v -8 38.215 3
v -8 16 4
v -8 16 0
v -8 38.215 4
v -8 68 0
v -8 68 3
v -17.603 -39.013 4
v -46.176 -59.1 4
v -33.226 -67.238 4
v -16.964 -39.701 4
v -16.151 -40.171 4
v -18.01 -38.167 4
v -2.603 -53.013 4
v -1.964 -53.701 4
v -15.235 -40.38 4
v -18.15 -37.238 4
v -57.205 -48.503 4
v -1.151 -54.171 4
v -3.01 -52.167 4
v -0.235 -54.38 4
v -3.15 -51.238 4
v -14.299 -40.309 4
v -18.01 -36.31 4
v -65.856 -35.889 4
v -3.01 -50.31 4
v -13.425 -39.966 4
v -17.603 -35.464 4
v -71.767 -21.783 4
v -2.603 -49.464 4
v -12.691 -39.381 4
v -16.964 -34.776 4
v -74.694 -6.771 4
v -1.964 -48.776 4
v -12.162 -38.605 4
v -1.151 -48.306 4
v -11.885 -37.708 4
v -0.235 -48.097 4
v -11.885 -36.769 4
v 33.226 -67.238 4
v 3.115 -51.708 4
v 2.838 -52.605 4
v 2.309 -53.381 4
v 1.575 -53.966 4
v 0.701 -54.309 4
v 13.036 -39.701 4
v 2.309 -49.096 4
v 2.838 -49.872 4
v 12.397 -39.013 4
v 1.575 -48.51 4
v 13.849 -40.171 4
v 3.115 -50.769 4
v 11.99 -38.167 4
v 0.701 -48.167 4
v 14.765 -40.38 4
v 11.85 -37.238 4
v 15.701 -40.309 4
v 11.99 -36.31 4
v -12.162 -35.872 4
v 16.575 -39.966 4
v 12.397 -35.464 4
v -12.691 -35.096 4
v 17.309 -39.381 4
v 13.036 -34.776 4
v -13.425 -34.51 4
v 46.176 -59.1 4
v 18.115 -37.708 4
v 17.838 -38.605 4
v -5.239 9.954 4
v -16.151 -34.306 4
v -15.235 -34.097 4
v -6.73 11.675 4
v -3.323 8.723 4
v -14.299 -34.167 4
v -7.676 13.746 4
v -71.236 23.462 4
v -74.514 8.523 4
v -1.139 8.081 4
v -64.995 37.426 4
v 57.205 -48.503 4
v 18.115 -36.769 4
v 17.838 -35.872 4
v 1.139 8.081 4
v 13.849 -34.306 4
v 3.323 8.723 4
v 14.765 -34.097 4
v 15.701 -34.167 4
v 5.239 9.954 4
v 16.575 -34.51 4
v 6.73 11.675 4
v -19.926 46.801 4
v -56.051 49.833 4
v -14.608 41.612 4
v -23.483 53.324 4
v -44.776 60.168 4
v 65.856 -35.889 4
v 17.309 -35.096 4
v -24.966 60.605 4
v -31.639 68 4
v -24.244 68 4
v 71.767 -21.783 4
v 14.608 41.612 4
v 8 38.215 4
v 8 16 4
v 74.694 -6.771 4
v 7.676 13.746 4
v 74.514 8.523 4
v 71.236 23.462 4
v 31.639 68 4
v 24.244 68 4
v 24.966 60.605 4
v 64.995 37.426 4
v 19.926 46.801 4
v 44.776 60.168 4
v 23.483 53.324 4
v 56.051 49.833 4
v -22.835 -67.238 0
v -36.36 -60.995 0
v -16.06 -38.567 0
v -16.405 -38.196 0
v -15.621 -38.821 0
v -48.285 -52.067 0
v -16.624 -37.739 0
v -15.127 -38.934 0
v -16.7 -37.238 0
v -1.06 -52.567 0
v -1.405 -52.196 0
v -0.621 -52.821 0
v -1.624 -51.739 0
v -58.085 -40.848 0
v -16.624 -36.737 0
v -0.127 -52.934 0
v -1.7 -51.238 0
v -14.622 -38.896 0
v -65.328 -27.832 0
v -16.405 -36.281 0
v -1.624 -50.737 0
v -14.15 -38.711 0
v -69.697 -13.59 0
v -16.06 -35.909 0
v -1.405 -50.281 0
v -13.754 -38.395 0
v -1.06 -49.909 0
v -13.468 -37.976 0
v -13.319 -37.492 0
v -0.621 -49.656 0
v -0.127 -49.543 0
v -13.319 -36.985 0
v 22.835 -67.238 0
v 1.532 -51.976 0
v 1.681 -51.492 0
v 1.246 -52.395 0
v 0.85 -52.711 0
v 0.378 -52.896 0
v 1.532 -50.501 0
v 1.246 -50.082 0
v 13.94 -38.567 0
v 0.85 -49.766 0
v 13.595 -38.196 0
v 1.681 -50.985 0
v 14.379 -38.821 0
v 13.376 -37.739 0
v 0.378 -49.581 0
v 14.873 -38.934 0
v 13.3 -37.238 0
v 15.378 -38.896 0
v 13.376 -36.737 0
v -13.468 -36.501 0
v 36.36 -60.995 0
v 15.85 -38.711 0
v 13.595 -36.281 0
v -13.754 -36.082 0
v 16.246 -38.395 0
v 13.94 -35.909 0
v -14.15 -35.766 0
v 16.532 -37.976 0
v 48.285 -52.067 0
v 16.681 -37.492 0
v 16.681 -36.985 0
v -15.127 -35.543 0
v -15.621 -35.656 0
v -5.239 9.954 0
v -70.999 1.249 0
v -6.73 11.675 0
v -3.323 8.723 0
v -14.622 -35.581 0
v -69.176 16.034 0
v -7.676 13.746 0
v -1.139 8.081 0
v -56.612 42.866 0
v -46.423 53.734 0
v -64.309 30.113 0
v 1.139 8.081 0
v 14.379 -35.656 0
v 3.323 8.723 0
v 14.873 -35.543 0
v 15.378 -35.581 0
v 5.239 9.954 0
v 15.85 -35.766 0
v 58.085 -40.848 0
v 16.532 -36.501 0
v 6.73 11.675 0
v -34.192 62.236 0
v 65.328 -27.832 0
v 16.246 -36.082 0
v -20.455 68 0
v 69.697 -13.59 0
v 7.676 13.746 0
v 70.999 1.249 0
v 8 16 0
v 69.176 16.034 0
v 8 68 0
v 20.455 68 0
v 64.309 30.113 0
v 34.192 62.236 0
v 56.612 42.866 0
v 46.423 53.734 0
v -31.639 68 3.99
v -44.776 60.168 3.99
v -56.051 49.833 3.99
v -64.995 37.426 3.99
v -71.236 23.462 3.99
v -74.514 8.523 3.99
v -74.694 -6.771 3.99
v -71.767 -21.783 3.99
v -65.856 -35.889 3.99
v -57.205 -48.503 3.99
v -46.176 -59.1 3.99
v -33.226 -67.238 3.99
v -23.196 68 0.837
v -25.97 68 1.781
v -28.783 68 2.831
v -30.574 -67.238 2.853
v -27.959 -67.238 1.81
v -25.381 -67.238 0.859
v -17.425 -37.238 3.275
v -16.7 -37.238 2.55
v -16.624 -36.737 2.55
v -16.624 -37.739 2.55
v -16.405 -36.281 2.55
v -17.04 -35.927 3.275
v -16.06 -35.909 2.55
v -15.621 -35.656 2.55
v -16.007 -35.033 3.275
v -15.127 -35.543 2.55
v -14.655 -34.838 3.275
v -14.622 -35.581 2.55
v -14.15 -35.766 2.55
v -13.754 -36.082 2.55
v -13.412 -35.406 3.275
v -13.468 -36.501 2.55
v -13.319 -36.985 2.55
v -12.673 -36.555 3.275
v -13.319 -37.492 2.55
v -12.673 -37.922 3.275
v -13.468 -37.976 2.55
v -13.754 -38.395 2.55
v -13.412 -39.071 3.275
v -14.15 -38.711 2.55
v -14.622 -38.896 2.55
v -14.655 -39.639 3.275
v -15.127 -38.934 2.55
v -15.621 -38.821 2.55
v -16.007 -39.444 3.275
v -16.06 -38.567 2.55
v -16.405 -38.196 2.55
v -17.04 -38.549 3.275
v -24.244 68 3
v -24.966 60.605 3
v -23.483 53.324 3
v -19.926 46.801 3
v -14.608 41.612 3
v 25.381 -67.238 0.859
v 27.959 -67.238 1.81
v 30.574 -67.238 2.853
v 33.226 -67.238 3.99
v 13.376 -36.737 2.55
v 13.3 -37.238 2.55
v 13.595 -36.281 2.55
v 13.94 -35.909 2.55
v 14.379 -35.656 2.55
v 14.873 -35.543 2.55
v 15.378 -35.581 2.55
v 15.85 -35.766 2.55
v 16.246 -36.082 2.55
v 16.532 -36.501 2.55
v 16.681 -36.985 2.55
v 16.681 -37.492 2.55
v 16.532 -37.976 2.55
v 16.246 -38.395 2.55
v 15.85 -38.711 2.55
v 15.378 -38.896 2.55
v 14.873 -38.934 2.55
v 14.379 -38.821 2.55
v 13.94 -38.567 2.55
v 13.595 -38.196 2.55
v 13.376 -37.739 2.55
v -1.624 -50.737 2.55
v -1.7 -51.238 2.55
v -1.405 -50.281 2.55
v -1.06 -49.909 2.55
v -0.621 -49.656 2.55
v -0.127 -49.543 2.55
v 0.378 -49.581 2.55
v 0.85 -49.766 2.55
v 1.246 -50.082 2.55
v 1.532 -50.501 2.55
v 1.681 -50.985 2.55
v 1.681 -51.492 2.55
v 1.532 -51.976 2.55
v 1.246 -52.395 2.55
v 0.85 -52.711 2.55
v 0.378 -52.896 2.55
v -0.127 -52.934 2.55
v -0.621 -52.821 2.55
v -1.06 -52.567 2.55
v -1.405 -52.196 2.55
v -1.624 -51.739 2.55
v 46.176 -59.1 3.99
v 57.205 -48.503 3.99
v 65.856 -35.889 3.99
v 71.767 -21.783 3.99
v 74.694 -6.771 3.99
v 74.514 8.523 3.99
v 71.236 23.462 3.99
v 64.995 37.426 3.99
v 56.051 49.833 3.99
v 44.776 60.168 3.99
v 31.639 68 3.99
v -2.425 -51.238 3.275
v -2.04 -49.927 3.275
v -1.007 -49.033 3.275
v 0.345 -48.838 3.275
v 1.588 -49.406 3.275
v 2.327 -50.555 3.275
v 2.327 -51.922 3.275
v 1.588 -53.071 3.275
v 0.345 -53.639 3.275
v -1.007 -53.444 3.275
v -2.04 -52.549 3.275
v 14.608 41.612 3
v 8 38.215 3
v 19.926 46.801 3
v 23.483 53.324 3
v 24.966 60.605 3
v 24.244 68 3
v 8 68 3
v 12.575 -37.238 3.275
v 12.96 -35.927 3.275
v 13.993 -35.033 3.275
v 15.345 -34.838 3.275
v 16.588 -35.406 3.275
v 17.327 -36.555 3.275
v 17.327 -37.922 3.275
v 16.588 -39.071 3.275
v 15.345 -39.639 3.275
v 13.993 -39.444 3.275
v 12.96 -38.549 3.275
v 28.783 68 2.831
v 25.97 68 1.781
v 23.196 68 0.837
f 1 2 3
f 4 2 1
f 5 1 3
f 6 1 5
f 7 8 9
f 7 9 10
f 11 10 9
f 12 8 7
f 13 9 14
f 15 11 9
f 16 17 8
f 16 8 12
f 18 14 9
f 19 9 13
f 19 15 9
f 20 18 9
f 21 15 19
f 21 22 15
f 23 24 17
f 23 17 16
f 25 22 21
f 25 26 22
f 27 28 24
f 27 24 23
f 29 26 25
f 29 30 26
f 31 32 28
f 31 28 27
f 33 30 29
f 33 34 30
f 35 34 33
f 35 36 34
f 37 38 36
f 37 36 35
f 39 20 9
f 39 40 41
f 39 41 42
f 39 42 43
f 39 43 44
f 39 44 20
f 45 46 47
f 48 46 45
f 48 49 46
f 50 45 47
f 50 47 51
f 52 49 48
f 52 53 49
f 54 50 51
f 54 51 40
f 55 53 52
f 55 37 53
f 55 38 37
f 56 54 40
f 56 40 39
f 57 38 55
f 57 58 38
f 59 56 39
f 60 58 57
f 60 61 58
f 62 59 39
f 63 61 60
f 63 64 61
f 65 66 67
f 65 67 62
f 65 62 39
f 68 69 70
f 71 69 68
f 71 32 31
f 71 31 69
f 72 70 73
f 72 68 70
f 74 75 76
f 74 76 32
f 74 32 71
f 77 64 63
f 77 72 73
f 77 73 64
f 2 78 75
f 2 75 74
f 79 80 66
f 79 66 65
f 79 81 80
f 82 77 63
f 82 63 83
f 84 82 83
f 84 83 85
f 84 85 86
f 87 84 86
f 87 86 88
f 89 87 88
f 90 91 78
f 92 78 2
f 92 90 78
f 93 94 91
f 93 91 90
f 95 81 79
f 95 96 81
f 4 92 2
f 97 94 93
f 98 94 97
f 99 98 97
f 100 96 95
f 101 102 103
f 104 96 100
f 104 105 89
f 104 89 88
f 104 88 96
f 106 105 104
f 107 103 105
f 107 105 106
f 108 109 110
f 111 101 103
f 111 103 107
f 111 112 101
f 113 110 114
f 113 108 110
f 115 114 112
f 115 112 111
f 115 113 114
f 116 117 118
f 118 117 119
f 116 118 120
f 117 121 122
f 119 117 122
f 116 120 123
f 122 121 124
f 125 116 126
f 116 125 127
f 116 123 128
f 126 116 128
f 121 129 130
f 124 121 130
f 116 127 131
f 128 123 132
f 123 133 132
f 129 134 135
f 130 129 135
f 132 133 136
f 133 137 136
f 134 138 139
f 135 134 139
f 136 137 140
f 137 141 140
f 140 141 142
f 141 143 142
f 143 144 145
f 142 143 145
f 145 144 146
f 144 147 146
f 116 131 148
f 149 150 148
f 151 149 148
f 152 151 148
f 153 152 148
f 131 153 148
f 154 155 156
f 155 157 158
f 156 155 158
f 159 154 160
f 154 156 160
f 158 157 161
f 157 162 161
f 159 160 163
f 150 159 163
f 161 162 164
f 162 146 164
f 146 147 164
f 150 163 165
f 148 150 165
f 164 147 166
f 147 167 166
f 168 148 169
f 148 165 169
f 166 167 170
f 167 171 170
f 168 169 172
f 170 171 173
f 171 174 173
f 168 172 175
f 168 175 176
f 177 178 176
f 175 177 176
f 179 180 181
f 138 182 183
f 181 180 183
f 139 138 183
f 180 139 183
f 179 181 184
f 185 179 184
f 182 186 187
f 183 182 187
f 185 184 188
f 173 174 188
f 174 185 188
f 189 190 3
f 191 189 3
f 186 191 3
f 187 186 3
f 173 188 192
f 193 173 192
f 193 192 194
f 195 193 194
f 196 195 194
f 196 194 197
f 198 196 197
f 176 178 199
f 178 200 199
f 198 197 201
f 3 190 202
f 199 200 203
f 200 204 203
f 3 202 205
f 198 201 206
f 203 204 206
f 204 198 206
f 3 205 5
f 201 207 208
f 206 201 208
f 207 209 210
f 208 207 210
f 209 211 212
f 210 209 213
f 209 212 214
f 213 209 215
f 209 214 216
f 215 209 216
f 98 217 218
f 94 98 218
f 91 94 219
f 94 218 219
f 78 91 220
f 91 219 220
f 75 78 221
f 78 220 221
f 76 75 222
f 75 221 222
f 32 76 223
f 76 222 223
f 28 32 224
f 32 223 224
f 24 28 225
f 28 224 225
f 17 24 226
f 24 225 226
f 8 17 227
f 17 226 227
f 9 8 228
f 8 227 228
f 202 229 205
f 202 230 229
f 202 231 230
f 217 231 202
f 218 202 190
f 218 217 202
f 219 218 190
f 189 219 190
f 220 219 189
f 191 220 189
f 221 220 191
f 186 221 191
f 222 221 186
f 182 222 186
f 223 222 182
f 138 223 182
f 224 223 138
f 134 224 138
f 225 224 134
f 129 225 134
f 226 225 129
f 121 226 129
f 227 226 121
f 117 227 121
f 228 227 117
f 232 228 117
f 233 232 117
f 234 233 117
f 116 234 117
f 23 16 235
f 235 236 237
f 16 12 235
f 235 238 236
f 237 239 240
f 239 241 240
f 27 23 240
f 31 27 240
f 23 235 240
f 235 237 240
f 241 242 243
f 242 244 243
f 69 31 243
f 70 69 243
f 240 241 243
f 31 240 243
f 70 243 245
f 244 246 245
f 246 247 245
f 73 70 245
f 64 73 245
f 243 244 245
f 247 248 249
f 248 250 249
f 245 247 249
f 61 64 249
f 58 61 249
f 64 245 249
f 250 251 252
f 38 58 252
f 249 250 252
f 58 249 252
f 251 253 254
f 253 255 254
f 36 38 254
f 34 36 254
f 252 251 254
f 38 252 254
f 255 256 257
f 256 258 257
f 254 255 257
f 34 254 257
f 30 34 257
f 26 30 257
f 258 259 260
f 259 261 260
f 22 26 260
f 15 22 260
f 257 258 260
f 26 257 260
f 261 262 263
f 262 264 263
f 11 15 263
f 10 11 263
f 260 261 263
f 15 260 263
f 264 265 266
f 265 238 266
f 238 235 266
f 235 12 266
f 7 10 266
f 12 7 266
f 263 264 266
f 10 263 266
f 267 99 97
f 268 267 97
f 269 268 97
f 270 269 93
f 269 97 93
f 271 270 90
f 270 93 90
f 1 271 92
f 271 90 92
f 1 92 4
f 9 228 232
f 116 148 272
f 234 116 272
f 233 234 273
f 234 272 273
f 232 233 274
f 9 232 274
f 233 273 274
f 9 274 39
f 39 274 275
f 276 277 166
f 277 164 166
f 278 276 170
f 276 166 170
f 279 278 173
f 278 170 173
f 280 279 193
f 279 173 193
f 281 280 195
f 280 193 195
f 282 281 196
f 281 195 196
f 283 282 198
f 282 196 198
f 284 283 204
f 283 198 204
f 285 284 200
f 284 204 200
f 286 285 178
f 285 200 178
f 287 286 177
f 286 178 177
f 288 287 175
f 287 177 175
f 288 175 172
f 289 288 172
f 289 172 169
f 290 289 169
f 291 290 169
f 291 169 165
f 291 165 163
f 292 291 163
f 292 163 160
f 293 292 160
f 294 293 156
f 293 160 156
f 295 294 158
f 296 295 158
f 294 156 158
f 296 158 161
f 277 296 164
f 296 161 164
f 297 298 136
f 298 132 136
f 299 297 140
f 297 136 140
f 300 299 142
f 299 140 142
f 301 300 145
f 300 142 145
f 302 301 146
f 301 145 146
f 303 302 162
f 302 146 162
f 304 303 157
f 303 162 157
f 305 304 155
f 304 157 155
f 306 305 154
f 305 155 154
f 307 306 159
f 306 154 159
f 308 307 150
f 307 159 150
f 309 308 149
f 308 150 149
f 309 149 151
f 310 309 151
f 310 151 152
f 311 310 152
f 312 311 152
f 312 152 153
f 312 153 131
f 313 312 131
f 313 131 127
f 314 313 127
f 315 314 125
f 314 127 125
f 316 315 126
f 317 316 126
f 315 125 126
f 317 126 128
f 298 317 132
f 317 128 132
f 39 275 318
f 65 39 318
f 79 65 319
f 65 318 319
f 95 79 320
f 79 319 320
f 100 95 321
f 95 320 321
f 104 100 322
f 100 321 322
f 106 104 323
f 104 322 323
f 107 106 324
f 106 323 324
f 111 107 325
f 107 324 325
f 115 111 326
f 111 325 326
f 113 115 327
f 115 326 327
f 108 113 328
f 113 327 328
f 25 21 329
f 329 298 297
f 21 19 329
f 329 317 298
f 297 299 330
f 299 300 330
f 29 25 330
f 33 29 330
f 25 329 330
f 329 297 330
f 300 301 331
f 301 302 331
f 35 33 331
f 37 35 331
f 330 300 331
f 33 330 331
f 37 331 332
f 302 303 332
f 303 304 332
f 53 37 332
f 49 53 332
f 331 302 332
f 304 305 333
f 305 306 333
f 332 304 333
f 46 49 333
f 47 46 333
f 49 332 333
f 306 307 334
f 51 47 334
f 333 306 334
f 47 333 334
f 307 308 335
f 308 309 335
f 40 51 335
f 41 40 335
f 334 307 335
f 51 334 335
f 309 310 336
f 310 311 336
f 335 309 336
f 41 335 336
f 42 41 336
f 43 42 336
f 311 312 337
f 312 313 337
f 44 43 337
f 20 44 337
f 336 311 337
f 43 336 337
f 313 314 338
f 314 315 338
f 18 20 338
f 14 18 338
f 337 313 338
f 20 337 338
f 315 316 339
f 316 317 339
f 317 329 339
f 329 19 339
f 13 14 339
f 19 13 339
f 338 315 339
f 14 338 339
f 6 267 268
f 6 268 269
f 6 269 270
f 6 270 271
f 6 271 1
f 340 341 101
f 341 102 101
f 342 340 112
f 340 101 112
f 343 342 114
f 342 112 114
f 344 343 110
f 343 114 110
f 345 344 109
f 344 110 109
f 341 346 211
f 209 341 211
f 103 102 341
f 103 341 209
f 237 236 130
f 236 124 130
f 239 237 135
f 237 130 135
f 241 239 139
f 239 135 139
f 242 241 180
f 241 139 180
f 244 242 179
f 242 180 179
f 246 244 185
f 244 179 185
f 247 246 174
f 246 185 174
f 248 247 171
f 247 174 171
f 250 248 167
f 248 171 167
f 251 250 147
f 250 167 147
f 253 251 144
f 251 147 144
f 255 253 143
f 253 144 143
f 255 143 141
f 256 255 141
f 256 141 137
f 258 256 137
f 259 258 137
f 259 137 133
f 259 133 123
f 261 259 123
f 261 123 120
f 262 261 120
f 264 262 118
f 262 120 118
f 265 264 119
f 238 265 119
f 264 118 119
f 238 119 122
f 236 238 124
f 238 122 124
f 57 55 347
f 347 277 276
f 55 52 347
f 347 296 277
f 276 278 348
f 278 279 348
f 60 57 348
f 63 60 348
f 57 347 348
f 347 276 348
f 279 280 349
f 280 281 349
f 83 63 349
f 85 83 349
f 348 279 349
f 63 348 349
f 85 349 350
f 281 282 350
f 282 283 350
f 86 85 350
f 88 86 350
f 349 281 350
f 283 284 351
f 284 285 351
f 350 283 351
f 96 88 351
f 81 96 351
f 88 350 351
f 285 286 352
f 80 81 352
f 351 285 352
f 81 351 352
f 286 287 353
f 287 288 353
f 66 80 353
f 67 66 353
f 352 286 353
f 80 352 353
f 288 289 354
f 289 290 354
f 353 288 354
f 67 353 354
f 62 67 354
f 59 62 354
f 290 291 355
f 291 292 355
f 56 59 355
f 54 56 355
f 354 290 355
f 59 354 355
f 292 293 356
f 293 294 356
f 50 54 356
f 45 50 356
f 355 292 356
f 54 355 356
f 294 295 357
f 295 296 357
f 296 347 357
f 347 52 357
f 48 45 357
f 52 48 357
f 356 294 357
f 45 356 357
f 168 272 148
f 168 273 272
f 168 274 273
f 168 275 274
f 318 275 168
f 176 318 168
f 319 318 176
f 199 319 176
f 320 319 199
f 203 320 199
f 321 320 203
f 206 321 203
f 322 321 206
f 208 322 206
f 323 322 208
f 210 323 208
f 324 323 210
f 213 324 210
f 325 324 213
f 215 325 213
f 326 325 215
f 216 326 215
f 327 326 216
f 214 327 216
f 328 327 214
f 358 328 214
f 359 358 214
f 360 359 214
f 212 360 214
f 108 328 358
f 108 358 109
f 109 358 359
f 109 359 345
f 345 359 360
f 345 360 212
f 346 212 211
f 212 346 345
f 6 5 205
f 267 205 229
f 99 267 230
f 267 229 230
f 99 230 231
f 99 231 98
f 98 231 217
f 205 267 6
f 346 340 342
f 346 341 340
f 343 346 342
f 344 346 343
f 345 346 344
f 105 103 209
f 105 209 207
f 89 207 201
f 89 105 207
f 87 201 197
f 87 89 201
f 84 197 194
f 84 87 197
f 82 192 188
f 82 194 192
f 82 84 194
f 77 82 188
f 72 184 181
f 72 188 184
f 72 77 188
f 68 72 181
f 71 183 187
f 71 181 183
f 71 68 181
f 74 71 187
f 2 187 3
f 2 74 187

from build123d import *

# Parameters (mm, degrees)
BOSS_EXTRUDE2_DEPTH                                 = 4
CSK_FOR_M3_COUNTERSUNK_FLAT_HEAD_SCREW1_D           = 3.4
CSK_FOR_M3_COUNTERSUNK_FLAT_HEAD_SCREW1_CSINK_D     = 6.3
CSK_FOR_M3_COUNTERSUNK_FLAT_HEAD_SCREW1_CSINK_ANGLE = 90
CUT_EXTRUDE1_REACH                                  = 103.316
SKETCH5_R                                           = 25
CUT_EXTRUDE2_DEPTH                                  = 1
CHAMFER3_SIZE                                       = 3.99


with BuildPart() as part:
    # Sketch1 → Boss-Extrude2 (new body)
    with BuildSketch(Plane.XY):
        with BuildLine():
            Line((-33.226495452, -67.238381896), (33.226495452, -67.238381896))
            ThreePointArc((33.226495452, -67.238381896), (74.994830614, 0.880557322), (31.638584039, 68))
            Line((31.638584039, 68), (-31.638584039, 68))
            ThreePointArc((-31.638584039, 68), (-74.994830614, 0.880557322), (-33.226495452, -67.238381896))
        make_face()
    extrude(amount=BOSS_EXTRUDE2_DEPTH)

    # CSK for M3 Countersunk Flat Head Screw1 (through all)
    with Locations(Plane.XY.offset(4)):
        with Locations((-15, -37.238381896), (0, -51.238381896), (15, -37.238381896)):
            CounterSinkHole(CSK_FOR_M3_COUNTERSUNK_FLAT_HEAD_SCREW1_D / 2, CSK_FOR_M3_COUNTERSUNK_FLAT_HEAD_SCREW1_CSINK_D / 2, counter_sink_angle=CSK_FOR_M3_COUNTERSUNK_FLAT_HEAD_SCREW1_CSINK_ANGLE)

    # Sketch4 → Cut-Extrude1 (cut, up to next)
    with BuildSketch(Plane.XY.offset(4), mode=Mode.PRIVATE) as cut_extrude1_sk1:
        with BuildLine():
            Line((-8, 16), (-8, 68))
            Line((-8, 68), (8, 68))
            Line((8, 68), (8, 16))
            ThreePointArc((8, 16), (0, 8), (-8, 16))
        make_face()
    cut_extrude1_tool1 = extrude(cut_extrude1_sk1.sketch, amount=-CUT_EXTRUDE1_REACH, mode=Mode.PRIVATE) & part.part
    add(cut_extrude1_tool1.solids().sort_by_distance((0, 38.831056, 4))[0], mode=Mode.SUBTRACT)

    # Sketch5 → Cut-Extrude2 (cut)
    with BuildSketch(Plane.XY.offset(4)):
        with Locations((0, 61.9)):
            Circle(SKETCH5_R)
    extrude(amount=-CUT_EXTRUDE2_DEPTH, mode=Mode.SUBTRACT)

    # Chamfer3
    chamfer3_edges = [part.edges().sort_by_distance(p)[0] for p in [
        (74.994830614, 0.880557322, 0),
        (-74.994830614, 0.880557322, 0),
    ]]
    chamfer(chamfer3_edges, length=CHAMFER3_SIZE)


solid = part.part
